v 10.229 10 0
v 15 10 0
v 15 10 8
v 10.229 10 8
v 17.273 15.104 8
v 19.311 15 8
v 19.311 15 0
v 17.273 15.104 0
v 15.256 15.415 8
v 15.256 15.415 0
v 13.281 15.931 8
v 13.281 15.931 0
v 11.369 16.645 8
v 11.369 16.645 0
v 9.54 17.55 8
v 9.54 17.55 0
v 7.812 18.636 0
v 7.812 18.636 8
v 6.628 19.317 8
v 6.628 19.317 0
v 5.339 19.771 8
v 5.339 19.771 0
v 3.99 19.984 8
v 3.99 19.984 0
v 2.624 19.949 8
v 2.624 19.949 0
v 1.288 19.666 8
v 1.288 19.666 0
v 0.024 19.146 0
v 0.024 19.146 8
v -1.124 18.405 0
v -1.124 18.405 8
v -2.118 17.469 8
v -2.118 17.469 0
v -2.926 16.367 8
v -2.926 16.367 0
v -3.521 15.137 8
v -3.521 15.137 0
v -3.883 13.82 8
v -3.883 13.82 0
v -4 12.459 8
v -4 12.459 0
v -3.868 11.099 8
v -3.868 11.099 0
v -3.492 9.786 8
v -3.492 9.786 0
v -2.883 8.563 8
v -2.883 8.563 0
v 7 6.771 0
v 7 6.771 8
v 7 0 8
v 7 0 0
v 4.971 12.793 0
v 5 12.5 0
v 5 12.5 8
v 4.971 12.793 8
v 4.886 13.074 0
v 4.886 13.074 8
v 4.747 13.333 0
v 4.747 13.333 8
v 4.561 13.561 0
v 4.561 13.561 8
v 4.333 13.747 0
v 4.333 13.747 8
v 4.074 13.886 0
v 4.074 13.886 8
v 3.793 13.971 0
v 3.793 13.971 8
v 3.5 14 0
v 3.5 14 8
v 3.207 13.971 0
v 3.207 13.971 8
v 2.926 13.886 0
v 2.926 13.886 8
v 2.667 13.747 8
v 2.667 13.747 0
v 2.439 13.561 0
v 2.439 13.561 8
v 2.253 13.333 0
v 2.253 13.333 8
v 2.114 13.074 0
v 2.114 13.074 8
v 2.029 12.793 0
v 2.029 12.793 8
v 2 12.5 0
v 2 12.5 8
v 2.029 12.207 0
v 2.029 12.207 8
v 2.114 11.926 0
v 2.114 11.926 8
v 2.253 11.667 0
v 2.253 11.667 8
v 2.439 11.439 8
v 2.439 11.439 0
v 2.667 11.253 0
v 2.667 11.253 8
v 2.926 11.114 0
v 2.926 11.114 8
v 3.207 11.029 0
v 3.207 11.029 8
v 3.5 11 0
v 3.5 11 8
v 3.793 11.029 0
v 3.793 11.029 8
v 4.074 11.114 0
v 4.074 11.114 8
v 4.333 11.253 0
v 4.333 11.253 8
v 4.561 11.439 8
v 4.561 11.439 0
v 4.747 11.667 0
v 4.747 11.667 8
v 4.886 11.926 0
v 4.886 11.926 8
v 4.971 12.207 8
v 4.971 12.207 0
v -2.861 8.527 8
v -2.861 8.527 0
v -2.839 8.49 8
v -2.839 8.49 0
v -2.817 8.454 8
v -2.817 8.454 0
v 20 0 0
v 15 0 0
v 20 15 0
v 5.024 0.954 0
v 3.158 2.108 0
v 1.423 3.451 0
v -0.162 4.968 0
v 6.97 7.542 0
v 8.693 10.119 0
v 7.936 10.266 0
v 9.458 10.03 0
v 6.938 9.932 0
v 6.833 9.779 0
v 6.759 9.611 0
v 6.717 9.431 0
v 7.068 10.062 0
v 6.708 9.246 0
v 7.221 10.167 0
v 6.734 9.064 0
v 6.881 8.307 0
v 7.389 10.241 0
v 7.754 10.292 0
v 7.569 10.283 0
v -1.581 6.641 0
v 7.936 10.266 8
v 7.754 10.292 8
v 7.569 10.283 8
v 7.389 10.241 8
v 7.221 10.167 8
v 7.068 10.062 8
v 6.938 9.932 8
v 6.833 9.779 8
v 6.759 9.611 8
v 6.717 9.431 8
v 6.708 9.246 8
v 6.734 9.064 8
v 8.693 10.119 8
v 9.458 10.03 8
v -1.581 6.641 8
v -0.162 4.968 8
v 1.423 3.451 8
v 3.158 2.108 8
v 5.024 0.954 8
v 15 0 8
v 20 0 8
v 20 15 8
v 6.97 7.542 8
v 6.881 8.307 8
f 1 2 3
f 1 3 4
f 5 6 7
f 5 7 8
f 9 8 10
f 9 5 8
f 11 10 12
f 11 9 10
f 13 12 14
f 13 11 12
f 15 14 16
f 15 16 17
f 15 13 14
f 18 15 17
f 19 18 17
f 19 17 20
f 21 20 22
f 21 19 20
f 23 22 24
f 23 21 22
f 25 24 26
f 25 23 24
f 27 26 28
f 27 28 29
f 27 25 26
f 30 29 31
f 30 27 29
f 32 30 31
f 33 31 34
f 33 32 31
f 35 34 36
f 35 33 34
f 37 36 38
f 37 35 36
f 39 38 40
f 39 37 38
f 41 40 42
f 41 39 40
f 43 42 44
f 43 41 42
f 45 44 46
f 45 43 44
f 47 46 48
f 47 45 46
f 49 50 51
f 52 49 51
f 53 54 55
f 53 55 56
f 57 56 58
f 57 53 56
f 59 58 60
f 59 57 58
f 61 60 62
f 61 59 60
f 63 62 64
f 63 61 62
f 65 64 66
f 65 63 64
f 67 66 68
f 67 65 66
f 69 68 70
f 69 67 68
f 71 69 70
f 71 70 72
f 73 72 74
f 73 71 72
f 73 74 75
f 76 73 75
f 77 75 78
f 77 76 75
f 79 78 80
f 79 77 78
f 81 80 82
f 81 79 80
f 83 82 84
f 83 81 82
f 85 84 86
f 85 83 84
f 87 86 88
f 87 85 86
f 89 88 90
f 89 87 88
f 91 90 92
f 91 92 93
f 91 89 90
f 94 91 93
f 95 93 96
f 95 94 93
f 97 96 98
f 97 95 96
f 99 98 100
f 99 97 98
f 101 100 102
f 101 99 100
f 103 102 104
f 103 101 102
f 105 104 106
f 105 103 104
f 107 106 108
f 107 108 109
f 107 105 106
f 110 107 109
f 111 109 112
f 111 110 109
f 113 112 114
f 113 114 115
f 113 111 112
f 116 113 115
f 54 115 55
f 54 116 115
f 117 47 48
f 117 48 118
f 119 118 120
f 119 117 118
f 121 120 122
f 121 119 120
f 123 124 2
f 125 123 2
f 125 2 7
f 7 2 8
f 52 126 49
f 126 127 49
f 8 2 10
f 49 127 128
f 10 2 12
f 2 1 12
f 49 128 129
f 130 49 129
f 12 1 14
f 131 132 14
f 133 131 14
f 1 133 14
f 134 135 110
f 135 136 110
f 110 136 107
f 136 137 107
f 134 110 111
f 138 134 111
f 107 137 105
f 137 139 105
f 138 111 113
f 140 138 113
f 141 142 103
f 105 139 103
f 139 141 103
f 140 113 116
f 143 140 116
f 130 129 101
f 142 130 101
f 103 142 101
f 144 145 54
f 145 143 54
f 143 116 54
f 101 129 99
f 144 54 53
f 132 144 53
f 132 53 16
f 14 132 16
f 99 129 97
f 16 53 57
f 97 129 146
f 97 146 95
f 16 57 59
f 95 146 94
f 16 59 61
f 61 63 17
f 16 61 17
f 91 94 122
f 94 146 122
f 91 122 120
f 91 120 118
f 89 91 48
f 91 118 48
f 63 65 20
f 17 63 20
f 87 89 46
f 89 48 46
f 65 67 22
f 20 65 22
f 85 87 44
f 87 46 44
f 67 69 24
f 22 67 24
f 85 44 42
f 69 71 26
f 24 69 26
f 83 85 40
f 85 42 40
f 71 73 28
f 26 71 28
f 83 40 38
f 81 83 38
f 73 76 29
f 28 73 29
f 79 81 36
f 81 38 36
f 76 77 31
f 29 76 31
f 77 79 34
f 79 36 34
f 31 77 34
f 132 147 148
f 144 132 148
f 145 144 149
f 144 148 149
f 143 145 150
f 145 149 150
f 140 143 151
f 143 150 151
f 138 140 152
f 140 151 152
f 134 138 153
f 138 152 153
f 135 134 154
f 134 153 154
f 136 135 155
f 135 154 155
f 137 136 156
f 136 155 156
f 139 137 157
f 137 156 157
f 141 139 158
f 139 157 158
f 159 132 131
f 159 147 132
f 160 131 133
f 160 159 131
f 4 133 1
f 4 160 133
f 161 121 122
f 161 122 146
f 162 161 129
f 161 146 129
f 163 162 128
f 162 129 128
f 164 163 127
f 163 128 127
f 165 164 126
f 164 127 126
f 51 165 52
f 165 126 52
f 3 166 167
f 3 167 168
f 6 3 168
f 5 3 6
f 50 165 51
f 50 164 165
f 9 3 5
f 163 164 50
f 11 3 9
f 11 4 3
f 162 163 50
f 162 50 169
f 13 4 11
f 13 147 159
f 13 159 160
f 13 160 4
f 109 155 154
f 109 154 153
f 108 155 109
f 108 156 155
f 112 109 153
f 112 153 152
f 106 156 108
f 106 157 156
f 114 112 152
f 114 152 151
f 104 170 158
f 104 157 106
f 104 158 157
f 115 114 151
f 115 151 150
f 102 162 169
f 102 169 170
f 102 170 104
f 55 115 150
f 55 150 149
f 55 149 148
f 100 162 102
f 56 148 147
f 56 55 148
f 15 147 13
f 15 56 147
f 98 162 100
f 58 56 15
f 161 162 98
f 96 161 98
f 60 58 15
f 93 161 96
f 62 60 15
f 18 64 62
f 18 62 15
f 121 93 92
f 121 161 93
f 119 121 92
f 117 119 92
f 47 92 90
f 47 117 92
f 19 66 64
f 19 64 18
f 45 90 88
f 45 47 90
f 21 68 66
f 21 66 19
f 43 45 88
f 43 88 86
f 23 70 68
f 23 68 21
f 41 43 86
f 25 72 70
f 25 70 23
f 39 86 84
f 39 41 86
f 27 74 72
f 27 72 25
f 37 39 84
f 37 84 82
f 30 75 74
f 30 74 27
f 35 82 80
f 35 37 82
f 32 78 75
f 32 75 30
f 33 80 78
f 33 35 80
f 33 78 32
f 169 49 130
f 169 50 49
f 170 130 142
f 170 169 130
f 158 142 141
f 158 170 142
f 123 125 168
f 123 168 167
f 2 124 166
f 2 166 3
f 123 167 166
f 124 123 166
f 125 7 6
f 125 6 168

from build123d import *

# Parameters (mm, degrees)
SKETCH1_R           = 1.5
BOSS_EXTRUDE1_DEPTH = 8
SKETCH2_R           = 1
CUT_EXTRUDE1_DEPTH  = 27.248809497
FILLET1_R           = 10
BOSS_EXTRUDE2_DEPTH = 8
FILLET2_R           = 20
FILLET3_R           = 21


with BuildPart() as part:
    # Sketch1 → Boss-Extrude1 (new body)
    with BuildSketch(Plane.XY):
        Polygon((20, 0), (15, 0), (15, 10), (7, 10), (7, 0), (0, 0), (0, 15), (20, 15), align=None)
        with Locations((3.5, 12.5)):
            Circle(SKETCH1_R, mode=Mode.SUBTRACT)
    extrude(amount=BOSS_EXTRUDE1_DEPTH)

    # Sketch2 → Cut-Extrude1 (cut, through all)
    with BuildSketch(Plane.XY.offset(8)):
        with Locations((7.707106781, 9.292893219)):
            Circle(SKETCH2_R)
    extrude(amount=-CUT_EXTRUDE1_DEPTH, mode=Mode.SUBTRACT)

    # Fillet1
    fillet1_edges = [part.edges().sort_by_distance(p)[0] for p in [
        (8.414213562, 10, 4),
        (7, 8.585786438, 4),
    ]]
    fillet(fillet1_edges, radius=FILLET1_R)

    # Sketch3 → Boss-Extrude2 (add)
    with BuildSketch(Plane.XY.offset(8)):
        with BuildLine():
            Line((0, 15), (10.571067812, 15))
            ThreePointArc((10.571067812, 15), (-1.403283931, 18.175192217), (0, 5.866750419))
            Line((0, 5.866750419), (0, 15))
        make_face()
    extrude(amount=-BOSS_EXTRUDE2_DEPTH)

    # Fillet2
    # the kernel refuses this fillet: 20 mm, written as the material it adds along each edge
    with BuildSketch(Plane(origin=(10.571067812, 15, 8), x_dir=(1, 0, 0), z_dir=(0, 0, -1))) as fillet2_piece_1:
        with BuildLine():
            CenterArc((8.740320489, -20), FILLET2_R, 90, 35.096801228)
            Line((-2.758871003, -3.636363636), (-2.988854832, -3.309090909))
            ThreePointArc((-2.988854832, -3.309090909), (-1.414747274, -1.791391146), (-0.377123617, 0.133333333))
            Line((-0.377123617, 0.133333333), (0, 0.4))
            Line((0, 0.4), (8.740320489, 0.4))
            Line((8.740320489, 0.4), (8.740320489, 0))
        make_face()
    extrude(amount=8)
    with BuildSketch(Plane(origin=(0, 5.866750419, 8), x_dir=(0, -1, 0), z_dir=(0, 0, -1))) as fillet2_piece_2:
        with BuildLine():
            CenterArc((7.803057197, 19.906047223), FILLET2_R, 238.334677688, 26.109509541)
            Line((-2.696075005, 2.883467425), (-2.906057649, 2.543015829))
            ThreePointArc((-2.906057649, 2.543015829), (-1.447100359, 1.349108809), (-0.353773311, -0.186666667))
            Line((-0.353773311, -0.186666667), (0, -0.4))
            ThreePointArc((0, -0.4), (2.93337521, -0.4), (5.828024284, -0.398120944))
            Line((5.828024284, -0.398120944), (5.866750419, 0))
        make_face()
    extrude(amount=8)

    # Fillet3
    # the kernel refuses this fillet: 21 mm, written as the material it takes off along each edge
    with BuildSketch(Plane(origin=(0, 0, -22.27715114), x_dir=(-0.3161074470851615, 0.9487233958838066, 0), z_dir=(0, 0, 1))) as fillet3_piece_1:
        with BuildLine():
            CenterArc((13.589062195, -20.472284398), FILLET3_R, 102.871869537, 35.932692131)
            Line((-2.21275213, -6.641063771), (-2.528788416, -6.364439359))
            ThreePointArc((-2.528788416, -6.364439359), (-1.504839891, -3.187766758), (-0.398463826, 0.132765128))
            Line((-0.398463826, 0.132765128), (0.093564035, 0.409445688))
            ThreePointArc((0.093564035, 0.409445688), (4.455430228, -0.082586287), (8.817296421, 0.409445688))
            Line((8.817296421, 0.409445688), (8.910860456, 0))
        make_face()
    extrude(amount=52.55430228, mode=Mode.SUBTRACT)


solid = part.part
